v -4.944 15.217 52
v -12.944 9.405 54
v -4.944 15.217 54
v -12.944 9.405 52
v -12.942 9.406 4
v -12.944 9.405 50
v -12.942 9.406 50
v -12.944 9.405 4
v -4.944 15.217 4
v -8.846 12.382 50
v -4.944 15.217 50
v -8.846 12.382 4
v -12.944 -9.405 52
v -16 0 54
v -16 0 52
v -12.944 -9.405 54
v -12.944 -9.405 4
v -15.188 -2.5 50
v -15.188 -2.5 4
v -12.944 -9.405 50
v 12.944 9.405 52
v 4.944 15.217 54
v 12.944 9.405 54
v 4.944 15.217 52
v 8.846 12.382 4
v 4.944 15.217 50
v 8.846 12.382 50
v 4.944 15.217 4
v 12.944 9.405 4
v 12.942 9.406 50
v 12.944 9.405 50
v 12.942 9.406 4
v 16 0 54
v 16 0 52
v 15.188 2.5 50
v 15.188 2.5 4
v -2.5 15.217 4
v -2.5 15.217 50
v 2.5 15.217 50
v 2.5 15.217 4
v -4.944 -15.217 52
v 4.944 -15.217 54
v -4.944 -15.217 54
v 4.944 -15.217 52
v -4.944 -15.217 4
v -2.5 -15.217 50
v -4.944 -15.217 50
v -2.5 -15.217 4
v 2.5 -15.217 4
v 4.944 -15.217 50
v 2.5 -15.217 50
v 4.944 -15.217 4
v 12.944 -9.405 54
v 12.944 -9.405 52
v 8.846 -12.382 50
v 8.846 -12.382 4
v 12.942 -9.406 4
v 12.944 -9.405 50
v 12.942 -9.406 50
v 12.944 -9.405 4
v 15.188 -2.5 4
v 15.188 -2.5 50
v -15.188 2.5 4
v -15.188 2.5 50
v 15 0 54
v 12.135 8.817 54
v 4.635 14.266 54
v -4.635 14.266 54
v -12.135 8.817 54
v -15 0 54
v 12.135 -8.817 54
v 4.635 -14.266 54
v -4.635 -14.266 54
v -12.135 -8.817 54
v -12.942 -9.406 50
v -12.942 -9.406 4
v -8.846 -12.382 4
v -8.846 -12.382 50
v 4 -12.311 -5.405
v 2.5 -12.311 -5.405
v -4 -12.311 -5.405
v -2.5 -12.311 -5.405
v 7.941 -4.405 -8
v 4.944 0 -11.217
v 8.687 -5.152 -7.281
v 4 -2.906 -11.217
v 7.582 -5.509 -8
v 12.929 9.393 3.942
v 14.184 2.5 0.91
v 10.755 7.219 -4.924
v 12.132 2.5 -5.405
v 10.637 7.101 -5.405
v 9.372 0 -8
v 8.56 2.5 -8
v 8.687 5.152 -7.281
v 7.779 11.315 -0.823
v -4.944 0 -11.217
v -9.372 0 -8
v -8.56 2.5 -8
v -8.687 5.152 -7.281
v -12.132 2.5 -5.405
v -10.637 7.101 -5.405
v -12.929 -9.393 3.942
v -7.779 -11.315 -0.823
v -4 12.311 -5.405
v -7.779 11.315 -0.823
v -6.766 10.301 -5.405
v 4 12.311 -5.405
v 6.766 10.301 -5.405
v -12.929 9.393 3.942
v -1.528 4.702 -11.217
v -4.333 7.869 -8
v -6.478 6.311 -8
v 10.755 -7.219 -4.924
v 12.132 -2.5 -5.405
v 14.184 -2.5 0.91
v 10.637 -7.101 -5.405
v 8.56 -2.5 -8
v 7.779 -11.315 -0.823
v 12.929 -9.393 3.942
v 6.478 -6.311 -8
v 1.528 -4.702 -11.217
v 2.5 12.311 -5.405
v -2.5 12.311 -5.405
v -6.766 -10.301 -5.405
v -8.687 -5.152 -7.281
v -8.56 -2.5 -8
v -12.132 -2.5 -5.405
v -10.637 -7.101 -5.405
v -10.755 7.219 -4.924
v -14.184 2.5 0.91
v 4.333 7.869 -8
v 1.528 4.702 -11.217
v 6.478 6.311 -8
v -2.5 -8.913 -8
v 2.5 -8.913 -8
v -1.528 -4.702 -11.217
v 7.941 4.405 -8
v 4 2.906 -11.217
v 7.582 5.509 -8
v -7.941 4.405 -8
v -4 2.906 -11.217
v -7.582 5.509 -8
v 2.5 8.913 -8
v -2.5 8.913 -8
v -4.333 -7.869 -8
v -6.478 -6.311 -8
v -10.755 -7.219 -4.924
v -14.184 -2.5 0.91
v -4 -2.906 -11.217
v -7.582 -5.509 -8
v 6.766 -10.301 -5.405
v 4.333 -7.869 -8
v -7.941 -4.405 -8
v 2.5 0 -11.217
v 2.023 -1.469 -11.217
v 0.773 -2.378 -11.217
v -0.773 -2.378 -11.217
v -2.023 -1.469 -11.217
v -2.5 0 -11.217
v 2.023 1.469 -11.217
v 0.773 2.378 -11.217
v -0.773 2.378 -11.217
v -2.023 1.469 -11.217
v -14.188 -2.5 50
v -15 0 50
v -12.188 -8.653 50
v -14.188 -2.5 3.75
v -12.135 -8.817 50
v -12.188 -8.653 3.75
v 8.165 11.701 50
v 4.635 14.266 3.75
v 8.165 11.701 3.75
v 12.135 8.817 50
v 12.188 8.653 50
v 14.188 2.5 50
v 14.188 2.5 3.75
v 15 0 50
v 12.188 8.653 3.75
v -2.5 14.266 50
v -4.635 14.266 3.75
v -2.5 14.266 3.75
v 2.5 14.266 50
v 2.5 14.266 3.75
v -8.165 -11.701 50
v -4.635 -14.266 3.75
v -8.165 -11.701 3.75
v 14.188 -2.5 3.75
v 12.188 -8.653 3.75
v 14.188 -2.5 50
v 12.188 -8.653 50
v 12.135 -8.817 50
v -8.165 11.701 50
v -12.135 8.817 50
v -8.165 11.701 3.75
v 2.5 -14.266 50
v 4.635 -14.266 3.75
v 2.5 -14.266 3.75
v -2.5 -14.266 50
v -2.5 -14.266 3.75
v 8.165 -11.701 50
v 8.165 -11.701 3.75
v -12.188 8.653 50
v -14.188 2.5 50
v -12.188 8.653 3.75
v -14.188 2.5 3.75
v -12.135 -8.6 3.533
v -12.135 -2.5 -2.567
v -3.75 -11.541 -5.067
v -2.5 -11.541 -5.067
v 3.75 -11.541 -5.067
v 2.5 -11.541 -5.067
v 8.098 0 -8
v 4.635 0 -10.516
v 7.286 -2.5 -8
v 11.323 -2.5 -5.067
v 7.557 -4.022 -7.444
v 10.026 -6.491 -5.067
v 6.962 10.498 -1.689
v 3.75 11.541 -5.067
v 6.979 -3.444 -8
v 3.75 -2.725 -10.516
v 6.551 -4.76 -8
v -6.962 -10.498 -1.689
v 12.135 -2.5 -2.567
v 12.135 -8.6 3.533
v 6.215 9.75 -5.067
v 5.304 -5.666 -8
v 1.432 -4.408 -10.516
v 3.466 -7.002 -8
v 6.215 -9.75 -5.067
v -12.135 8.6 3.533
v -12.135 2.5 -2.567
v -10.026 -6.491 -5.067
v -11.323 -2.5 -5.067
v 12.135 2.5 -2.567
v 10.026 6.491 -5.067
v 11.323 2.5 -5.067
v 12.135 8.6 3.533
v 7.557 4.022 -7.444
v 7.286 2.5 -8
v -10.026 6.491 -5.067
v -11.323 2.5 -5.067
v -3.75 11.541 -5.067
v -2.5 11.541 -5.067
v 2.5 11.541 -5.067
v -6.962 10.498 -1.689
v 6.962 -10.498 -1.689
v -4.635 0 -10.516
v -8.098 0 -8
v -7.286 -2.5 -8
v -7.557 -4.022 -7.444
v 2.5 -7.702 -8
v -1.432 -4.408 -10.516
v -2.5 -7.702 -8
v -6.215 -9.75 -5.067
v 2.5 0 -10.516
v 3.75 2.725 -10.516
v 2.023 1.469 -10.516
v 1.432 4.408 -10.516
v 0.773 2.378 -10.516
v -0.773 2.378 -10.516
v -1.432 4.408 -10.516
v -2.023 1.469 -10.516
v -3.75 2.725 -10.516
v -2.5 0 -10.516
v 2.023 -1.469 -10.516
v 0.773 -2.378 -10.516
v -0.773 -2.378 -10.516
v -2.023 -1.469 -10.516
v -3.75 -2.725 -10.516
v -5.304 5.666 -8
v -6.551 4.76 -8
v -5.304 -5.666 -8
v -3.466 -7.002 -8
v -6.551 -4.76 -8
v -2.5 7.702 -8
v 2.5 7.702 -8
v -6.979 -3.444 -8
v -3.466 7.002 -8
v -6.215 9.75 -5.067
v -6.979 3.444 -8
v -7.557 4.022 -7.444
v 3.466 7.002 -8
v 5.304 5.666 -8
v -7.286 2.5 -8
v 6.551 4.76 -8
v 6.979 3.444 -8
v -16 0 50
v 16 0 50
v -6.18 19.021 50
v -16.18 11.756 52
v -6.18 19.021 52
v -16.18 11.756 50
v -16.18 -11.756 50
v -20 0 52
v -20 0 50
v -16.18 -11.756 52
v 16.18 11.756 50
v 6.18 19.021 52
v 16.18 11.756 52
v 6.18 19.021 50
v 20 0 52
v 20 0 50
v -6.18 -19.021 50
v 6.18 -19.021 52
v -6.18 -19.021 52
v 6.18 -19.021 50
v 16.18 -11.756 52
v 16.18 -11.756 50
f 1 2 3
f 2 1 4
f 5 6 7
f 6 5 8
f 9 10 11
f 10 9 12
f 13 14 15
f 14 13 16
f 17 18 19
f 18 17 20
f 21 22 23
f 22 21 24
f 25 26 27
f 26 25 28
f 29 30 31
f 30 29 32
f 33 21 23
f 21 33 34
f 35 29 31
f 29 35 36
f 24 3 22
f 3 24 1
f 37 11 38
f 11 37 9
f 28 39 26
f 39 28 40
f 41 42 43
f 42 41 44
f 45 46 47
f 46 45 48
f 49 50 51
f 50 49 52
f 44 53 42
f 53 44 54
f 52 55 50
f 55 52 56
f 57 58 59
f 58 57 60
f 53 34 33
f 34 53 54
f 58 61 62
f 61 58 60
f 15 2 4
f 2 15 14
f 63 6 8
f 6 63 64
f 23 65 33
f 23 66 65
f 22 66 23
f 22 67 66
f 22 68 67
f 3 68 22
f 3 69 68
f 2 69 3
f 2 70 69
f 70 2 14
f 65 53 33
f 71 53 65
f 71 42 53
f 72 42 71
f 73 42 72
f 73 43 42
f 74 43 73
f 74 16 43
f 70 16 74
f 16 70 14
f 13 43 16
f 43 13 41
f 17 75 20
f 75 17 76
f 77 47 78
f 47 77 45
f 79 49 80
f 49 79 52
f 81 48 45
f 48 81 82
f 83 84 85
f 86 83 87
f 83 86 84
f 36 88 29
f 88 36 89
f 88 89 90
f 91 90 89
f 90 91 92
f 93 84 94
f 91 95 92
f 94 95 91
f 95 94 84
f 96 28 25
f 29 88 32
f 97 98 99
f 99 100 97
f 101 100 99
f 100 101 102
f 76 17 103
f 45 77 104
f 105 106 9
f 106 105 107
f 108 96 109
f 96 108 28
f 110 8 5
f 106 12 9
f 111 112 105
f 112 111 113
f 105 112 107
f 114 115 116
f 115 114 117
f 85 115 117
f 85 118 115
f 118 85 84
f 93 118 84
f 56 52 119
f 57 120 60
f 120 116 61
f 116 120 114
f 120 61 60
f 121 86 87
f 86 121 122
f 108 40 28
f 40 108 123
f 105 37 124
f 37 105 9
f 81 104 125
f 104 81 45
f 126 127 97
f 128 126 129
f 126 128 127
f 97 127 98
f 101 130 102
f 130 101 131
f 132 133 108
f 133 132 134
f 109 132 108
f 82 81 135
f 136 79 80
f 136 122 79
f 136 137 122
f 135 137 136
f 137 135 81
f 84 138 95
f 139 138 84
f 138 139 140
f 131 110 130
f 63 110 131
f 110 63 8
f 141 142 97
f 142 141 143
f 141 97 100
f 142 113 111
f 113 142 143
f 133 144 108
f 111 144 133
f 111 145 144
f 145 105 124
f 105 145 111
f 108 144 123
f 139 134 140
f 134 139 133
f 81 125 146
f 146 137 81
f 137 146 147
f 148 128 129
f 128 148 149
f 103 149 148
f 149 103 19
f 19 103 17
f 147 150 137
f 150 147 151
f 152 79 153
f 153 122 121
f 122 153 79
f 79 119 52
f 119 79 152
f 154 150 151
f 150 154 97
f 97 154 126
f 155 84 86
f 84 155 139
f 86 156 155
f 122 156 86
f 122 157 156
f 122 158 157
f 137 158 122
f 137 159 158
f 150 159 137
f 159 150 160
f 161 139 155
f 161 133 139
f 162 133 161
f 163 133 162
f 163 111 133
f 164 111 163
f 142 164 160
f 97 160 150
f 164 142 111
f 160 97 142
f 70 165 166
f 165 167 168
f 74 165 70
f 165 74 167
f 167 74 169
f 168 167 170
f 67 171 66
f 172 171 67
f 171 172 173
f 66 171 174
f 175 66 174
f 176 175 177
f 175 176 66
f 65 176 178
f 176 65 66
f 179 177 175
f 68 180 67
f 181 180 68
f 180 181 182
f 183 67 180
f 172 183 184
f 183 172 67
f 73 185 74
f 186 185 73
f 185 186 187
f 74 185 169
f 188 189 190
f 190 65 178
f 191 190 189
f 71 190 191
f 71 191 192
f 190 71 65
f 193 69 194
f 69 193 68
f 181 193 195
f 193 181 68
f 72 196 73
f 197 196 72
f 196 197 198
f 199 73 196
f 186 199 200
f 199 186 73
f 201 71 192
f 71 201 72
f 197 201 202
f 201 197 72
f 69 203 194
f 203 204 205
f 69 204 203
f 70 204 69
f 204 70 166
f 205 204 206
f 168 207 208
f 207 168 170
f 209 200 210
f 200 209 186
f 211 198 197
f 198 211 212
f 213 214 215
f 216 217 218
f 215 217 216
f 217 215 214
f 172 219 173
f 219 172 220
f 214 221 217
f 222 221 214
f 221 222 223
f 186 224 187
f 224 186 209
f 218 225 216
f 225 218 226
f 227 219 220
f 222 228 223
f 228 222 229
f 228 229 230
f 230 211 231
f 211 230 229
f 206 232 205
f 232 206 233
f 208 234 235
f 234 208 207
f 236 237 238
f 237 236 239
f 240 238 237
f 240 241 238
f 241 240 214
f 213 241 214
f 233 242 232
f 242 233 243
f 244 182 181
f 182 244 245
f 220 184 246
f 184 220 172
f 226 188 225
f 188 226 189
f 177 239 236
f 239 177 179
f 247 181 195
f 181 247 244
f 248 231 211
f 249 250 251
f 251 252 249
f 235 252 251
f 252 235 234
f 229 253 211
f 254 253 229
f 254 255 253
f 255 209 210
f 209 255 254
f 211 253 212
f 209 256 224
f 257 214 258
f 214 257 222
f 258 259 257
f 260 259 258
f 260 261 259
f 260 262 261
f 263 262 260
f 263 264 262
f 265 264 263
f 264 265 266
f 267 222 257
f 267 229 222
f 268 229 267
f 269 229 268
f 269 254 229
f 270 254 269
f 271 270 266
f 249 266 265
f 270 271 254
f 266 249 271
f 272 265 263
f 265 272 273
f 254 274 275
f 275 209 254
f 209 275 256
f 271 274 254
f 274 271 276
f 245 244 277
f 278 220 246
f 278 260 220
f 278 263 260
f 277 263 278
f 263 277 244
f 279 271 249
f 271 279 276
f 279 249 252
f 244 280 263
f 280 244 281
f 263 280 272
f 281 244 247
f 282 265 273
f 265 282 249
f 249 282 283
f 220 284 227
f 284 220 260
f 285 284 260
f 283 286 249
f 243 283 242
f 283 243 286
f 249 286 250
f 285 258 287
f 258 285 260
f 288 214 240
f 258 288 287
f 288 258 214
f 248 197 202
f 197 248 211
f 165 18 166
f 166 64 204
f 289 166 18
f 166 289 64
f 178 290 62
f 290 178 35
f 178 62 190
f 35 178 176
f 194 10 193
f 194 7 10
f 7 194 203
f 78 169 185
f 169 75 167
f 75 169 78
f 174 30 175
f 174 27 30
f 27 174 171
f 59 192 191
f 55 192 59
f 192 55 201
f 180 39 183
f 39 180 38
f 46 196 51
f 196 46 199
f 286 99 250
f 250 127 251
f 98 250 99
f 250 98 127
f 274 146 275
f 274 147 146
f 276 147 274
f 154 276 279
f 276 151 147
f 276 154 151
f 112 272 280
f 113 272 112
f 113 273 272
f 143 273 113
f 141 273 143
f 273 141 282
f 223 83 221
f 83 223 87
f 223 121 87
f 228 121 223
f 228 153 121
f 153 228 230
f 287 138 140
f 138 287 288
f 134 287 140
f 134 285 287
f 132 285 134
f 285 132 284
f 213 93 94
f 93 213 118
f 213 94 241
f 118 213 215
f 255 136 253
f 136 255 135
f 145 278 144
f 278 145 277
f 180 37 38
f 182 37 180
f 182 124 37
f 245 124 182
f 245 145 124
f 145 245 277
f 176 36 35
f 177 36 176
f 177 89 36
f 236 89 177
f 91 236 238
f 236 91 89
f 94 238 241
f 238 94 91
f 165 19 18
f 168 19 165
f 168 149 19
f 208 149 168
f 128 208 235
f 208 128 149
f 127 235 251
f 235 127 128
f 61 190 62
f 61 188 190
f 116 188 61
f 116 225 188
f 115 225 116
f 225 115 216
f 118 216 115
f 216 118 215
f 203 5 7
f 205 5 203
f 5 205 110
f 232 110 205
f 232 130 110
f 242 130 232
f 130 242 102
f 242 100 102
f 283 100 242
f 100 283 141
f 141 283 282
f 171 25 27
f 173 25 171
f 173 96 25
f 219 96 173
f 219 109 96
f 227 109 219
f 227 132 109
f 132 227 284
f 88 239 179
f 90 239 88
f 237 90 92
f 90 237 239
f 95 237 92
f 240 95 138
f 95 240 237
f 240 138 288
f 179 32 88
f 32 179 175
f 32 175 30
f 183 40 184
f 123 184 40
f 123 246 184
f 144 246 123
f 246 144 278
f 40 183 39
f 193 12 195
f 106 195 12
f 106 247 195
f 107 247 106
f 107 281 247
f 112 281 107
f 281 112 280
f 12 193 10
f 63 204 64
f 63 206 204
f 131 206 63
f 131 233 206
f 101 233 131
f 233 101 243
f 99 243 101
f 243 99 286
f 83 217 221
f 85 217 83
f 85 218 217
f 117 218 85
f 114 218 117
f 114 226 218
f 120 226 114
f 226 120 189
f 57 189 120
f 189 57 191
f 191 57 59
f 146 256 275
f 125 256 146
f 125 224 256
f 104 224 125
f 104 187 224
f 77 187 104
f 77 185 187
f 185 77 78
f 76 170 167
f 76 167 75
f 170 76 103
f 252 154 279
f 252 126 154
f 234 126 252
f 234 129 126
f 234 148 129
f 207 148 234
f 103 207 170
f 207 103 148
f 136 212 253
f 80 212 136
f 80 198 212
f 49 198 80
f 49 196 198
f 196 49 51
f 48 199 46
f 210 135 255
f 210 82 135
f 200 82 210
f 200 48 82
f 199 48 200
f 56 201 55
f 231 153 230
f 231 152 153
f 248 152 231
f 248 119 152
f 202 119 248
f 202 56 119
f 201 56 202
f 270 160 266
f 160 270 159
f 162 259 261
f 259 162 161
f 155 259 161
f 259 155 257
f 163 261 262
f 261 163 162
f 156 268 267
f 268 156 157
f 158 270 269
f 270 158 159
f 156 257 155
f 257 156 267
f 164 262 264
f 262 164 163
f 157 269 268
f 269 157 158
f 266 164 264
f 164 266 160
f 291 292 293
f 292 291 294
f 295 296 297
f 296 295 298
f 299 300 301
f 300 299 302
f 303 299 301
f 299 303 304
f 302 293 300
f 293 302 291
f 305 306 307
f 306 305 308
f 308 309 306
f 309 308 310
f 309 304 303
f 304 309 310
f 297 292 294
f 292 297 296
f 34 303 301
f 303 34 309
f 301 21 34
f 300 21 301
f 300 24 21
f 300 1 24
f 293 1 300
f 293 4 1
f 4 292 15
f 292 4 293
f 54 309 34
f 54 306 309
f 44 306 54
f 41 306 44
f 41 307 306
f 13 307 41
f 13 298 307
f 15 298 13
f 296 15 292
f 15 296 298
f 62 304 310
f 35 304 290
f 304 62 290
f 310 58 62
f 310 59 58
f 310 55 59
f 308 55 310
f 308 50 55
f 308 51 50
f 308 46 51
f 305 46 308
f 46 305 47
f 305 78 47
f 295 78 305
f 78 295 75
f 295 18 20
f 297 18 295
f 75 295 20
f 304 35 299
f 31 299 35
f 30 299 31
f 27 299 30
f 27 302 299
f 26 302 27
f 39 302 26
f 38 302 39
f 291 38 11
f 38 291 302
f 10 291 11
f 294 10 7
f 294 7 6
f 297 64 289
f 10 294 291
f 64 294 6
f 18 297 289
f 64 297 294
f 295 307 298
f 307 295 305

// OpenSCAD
// file: _variables.scad
/* [Render] */
$fa=1;
$fs=0.4;
$fn=10;
$show_helpers = false;

/* [General] */
$wall_thickness = 2;

/* [Main Body] */
$main_height = 100;
$main_radius = 35;
$joining_height = 10;
$joining_radius = $main_radius - $wall_thickness / 2;

/* [Tubes] */
$tube_height = $main_height / 2;
$tube_radius = $main_radius - 15;
$tube_hole_dimensions = 15;
$tube_hole_offset = 0;

/* [Cover] */
$hole_radius = $main_radius / 2.5;

/* [Planter] */
$stripes_count = 8;
$stripe_width = 5.0;
$planter_hole_radius = 2.5;

/* [Tray] */
$tray_thickness = 2.5;
$tray_hole_radius = 1;
$tray_radius = $main_radius - $wall_thickness;
$tray_holes_per_rotation = 4;
$tray_rotations = 16;

/* [Water Column] */
$water_column_radius = 5;
// main file
/*
 * All variables are stored inside `_variables.scad`.
 * Please examine this file and change to your needs.
 * OpenSCAD will recognize these changes automatically
 * & reload after editing.
 *
 * Why is this done?
 * Pretty much all files in this repository depend on each other.
 * For example:
 *  `[[0,1,2,3,4,5]-way, tube_with_hole, resvoir].scad` depend on `x_way.scad`.
 *  `x_way.scad` makes use of `tray.scad`.
 * Even seemingly unconnected files like `planter.scad` or `cover.scad`
 * are using variables that are defined in other files.
 * Yes, we could (like before) split all the variables out in their own files,
 * but a single change in one file requires you to also change it in
 * all other files for them to fit together.
 * Unfortunately, this breaks OpenSCAD's customizer.
 */
include<_variables.scad>;

// Parts
module planter_frame(r, th)
{
	a = r - $wall_thickness - 2; // 2 -> spacing
	translate([ 0, 0, a / 2 - a / 4 ])
	cylinder(h = th, r = a, center = false);
	translate([ 0, 0, a / 2 - a / 4 ])
	sphere(r = a);
}

module planter_ring(r, th)
{
	a = r - $wall_thickness - 2; // 2 -> spacing
	translate([ 0, 0, th ])
	difference()
	{
		cylinder(h = $wall_thickness, r = r, center = false);
		translate([ 0, 0, -1 ])
		cylinder(h = $wall_thickness + 2, r = a, center = false);
	}
}

module planter_hole()
{
	height = 10;
	translate([ 0, 0, -(height + height / 2) ])
	cylinder(h = height, r = $planter_hole_radius, center = false);
}

module planter_stripes(r, th)
{
	angle_per = 360 / $stripes_count;

	for (i = [0:$stripes_count])
	{
		a = r - $wall_thickness - 2; // 2 -> spacing
		current_angle = angle_per * i;

		rotate([ 0, 0, current_angle ])
		translate([ -$stripe_width / 2, -$stripe_width / 2, -(a / 2) ])
		cube([ 25, $stripe_width, th + a / 2 ]);
	}
}

module planter(r, th)
{
	difference()
	{
		planter_frame(r, th);
		planter_frame(r - 1, th + 1);
		planter_stripes(r, th);
		planter_hole();
	}
	planter_ring(r, th);
}
planter($tube_radius, $tube_height);
